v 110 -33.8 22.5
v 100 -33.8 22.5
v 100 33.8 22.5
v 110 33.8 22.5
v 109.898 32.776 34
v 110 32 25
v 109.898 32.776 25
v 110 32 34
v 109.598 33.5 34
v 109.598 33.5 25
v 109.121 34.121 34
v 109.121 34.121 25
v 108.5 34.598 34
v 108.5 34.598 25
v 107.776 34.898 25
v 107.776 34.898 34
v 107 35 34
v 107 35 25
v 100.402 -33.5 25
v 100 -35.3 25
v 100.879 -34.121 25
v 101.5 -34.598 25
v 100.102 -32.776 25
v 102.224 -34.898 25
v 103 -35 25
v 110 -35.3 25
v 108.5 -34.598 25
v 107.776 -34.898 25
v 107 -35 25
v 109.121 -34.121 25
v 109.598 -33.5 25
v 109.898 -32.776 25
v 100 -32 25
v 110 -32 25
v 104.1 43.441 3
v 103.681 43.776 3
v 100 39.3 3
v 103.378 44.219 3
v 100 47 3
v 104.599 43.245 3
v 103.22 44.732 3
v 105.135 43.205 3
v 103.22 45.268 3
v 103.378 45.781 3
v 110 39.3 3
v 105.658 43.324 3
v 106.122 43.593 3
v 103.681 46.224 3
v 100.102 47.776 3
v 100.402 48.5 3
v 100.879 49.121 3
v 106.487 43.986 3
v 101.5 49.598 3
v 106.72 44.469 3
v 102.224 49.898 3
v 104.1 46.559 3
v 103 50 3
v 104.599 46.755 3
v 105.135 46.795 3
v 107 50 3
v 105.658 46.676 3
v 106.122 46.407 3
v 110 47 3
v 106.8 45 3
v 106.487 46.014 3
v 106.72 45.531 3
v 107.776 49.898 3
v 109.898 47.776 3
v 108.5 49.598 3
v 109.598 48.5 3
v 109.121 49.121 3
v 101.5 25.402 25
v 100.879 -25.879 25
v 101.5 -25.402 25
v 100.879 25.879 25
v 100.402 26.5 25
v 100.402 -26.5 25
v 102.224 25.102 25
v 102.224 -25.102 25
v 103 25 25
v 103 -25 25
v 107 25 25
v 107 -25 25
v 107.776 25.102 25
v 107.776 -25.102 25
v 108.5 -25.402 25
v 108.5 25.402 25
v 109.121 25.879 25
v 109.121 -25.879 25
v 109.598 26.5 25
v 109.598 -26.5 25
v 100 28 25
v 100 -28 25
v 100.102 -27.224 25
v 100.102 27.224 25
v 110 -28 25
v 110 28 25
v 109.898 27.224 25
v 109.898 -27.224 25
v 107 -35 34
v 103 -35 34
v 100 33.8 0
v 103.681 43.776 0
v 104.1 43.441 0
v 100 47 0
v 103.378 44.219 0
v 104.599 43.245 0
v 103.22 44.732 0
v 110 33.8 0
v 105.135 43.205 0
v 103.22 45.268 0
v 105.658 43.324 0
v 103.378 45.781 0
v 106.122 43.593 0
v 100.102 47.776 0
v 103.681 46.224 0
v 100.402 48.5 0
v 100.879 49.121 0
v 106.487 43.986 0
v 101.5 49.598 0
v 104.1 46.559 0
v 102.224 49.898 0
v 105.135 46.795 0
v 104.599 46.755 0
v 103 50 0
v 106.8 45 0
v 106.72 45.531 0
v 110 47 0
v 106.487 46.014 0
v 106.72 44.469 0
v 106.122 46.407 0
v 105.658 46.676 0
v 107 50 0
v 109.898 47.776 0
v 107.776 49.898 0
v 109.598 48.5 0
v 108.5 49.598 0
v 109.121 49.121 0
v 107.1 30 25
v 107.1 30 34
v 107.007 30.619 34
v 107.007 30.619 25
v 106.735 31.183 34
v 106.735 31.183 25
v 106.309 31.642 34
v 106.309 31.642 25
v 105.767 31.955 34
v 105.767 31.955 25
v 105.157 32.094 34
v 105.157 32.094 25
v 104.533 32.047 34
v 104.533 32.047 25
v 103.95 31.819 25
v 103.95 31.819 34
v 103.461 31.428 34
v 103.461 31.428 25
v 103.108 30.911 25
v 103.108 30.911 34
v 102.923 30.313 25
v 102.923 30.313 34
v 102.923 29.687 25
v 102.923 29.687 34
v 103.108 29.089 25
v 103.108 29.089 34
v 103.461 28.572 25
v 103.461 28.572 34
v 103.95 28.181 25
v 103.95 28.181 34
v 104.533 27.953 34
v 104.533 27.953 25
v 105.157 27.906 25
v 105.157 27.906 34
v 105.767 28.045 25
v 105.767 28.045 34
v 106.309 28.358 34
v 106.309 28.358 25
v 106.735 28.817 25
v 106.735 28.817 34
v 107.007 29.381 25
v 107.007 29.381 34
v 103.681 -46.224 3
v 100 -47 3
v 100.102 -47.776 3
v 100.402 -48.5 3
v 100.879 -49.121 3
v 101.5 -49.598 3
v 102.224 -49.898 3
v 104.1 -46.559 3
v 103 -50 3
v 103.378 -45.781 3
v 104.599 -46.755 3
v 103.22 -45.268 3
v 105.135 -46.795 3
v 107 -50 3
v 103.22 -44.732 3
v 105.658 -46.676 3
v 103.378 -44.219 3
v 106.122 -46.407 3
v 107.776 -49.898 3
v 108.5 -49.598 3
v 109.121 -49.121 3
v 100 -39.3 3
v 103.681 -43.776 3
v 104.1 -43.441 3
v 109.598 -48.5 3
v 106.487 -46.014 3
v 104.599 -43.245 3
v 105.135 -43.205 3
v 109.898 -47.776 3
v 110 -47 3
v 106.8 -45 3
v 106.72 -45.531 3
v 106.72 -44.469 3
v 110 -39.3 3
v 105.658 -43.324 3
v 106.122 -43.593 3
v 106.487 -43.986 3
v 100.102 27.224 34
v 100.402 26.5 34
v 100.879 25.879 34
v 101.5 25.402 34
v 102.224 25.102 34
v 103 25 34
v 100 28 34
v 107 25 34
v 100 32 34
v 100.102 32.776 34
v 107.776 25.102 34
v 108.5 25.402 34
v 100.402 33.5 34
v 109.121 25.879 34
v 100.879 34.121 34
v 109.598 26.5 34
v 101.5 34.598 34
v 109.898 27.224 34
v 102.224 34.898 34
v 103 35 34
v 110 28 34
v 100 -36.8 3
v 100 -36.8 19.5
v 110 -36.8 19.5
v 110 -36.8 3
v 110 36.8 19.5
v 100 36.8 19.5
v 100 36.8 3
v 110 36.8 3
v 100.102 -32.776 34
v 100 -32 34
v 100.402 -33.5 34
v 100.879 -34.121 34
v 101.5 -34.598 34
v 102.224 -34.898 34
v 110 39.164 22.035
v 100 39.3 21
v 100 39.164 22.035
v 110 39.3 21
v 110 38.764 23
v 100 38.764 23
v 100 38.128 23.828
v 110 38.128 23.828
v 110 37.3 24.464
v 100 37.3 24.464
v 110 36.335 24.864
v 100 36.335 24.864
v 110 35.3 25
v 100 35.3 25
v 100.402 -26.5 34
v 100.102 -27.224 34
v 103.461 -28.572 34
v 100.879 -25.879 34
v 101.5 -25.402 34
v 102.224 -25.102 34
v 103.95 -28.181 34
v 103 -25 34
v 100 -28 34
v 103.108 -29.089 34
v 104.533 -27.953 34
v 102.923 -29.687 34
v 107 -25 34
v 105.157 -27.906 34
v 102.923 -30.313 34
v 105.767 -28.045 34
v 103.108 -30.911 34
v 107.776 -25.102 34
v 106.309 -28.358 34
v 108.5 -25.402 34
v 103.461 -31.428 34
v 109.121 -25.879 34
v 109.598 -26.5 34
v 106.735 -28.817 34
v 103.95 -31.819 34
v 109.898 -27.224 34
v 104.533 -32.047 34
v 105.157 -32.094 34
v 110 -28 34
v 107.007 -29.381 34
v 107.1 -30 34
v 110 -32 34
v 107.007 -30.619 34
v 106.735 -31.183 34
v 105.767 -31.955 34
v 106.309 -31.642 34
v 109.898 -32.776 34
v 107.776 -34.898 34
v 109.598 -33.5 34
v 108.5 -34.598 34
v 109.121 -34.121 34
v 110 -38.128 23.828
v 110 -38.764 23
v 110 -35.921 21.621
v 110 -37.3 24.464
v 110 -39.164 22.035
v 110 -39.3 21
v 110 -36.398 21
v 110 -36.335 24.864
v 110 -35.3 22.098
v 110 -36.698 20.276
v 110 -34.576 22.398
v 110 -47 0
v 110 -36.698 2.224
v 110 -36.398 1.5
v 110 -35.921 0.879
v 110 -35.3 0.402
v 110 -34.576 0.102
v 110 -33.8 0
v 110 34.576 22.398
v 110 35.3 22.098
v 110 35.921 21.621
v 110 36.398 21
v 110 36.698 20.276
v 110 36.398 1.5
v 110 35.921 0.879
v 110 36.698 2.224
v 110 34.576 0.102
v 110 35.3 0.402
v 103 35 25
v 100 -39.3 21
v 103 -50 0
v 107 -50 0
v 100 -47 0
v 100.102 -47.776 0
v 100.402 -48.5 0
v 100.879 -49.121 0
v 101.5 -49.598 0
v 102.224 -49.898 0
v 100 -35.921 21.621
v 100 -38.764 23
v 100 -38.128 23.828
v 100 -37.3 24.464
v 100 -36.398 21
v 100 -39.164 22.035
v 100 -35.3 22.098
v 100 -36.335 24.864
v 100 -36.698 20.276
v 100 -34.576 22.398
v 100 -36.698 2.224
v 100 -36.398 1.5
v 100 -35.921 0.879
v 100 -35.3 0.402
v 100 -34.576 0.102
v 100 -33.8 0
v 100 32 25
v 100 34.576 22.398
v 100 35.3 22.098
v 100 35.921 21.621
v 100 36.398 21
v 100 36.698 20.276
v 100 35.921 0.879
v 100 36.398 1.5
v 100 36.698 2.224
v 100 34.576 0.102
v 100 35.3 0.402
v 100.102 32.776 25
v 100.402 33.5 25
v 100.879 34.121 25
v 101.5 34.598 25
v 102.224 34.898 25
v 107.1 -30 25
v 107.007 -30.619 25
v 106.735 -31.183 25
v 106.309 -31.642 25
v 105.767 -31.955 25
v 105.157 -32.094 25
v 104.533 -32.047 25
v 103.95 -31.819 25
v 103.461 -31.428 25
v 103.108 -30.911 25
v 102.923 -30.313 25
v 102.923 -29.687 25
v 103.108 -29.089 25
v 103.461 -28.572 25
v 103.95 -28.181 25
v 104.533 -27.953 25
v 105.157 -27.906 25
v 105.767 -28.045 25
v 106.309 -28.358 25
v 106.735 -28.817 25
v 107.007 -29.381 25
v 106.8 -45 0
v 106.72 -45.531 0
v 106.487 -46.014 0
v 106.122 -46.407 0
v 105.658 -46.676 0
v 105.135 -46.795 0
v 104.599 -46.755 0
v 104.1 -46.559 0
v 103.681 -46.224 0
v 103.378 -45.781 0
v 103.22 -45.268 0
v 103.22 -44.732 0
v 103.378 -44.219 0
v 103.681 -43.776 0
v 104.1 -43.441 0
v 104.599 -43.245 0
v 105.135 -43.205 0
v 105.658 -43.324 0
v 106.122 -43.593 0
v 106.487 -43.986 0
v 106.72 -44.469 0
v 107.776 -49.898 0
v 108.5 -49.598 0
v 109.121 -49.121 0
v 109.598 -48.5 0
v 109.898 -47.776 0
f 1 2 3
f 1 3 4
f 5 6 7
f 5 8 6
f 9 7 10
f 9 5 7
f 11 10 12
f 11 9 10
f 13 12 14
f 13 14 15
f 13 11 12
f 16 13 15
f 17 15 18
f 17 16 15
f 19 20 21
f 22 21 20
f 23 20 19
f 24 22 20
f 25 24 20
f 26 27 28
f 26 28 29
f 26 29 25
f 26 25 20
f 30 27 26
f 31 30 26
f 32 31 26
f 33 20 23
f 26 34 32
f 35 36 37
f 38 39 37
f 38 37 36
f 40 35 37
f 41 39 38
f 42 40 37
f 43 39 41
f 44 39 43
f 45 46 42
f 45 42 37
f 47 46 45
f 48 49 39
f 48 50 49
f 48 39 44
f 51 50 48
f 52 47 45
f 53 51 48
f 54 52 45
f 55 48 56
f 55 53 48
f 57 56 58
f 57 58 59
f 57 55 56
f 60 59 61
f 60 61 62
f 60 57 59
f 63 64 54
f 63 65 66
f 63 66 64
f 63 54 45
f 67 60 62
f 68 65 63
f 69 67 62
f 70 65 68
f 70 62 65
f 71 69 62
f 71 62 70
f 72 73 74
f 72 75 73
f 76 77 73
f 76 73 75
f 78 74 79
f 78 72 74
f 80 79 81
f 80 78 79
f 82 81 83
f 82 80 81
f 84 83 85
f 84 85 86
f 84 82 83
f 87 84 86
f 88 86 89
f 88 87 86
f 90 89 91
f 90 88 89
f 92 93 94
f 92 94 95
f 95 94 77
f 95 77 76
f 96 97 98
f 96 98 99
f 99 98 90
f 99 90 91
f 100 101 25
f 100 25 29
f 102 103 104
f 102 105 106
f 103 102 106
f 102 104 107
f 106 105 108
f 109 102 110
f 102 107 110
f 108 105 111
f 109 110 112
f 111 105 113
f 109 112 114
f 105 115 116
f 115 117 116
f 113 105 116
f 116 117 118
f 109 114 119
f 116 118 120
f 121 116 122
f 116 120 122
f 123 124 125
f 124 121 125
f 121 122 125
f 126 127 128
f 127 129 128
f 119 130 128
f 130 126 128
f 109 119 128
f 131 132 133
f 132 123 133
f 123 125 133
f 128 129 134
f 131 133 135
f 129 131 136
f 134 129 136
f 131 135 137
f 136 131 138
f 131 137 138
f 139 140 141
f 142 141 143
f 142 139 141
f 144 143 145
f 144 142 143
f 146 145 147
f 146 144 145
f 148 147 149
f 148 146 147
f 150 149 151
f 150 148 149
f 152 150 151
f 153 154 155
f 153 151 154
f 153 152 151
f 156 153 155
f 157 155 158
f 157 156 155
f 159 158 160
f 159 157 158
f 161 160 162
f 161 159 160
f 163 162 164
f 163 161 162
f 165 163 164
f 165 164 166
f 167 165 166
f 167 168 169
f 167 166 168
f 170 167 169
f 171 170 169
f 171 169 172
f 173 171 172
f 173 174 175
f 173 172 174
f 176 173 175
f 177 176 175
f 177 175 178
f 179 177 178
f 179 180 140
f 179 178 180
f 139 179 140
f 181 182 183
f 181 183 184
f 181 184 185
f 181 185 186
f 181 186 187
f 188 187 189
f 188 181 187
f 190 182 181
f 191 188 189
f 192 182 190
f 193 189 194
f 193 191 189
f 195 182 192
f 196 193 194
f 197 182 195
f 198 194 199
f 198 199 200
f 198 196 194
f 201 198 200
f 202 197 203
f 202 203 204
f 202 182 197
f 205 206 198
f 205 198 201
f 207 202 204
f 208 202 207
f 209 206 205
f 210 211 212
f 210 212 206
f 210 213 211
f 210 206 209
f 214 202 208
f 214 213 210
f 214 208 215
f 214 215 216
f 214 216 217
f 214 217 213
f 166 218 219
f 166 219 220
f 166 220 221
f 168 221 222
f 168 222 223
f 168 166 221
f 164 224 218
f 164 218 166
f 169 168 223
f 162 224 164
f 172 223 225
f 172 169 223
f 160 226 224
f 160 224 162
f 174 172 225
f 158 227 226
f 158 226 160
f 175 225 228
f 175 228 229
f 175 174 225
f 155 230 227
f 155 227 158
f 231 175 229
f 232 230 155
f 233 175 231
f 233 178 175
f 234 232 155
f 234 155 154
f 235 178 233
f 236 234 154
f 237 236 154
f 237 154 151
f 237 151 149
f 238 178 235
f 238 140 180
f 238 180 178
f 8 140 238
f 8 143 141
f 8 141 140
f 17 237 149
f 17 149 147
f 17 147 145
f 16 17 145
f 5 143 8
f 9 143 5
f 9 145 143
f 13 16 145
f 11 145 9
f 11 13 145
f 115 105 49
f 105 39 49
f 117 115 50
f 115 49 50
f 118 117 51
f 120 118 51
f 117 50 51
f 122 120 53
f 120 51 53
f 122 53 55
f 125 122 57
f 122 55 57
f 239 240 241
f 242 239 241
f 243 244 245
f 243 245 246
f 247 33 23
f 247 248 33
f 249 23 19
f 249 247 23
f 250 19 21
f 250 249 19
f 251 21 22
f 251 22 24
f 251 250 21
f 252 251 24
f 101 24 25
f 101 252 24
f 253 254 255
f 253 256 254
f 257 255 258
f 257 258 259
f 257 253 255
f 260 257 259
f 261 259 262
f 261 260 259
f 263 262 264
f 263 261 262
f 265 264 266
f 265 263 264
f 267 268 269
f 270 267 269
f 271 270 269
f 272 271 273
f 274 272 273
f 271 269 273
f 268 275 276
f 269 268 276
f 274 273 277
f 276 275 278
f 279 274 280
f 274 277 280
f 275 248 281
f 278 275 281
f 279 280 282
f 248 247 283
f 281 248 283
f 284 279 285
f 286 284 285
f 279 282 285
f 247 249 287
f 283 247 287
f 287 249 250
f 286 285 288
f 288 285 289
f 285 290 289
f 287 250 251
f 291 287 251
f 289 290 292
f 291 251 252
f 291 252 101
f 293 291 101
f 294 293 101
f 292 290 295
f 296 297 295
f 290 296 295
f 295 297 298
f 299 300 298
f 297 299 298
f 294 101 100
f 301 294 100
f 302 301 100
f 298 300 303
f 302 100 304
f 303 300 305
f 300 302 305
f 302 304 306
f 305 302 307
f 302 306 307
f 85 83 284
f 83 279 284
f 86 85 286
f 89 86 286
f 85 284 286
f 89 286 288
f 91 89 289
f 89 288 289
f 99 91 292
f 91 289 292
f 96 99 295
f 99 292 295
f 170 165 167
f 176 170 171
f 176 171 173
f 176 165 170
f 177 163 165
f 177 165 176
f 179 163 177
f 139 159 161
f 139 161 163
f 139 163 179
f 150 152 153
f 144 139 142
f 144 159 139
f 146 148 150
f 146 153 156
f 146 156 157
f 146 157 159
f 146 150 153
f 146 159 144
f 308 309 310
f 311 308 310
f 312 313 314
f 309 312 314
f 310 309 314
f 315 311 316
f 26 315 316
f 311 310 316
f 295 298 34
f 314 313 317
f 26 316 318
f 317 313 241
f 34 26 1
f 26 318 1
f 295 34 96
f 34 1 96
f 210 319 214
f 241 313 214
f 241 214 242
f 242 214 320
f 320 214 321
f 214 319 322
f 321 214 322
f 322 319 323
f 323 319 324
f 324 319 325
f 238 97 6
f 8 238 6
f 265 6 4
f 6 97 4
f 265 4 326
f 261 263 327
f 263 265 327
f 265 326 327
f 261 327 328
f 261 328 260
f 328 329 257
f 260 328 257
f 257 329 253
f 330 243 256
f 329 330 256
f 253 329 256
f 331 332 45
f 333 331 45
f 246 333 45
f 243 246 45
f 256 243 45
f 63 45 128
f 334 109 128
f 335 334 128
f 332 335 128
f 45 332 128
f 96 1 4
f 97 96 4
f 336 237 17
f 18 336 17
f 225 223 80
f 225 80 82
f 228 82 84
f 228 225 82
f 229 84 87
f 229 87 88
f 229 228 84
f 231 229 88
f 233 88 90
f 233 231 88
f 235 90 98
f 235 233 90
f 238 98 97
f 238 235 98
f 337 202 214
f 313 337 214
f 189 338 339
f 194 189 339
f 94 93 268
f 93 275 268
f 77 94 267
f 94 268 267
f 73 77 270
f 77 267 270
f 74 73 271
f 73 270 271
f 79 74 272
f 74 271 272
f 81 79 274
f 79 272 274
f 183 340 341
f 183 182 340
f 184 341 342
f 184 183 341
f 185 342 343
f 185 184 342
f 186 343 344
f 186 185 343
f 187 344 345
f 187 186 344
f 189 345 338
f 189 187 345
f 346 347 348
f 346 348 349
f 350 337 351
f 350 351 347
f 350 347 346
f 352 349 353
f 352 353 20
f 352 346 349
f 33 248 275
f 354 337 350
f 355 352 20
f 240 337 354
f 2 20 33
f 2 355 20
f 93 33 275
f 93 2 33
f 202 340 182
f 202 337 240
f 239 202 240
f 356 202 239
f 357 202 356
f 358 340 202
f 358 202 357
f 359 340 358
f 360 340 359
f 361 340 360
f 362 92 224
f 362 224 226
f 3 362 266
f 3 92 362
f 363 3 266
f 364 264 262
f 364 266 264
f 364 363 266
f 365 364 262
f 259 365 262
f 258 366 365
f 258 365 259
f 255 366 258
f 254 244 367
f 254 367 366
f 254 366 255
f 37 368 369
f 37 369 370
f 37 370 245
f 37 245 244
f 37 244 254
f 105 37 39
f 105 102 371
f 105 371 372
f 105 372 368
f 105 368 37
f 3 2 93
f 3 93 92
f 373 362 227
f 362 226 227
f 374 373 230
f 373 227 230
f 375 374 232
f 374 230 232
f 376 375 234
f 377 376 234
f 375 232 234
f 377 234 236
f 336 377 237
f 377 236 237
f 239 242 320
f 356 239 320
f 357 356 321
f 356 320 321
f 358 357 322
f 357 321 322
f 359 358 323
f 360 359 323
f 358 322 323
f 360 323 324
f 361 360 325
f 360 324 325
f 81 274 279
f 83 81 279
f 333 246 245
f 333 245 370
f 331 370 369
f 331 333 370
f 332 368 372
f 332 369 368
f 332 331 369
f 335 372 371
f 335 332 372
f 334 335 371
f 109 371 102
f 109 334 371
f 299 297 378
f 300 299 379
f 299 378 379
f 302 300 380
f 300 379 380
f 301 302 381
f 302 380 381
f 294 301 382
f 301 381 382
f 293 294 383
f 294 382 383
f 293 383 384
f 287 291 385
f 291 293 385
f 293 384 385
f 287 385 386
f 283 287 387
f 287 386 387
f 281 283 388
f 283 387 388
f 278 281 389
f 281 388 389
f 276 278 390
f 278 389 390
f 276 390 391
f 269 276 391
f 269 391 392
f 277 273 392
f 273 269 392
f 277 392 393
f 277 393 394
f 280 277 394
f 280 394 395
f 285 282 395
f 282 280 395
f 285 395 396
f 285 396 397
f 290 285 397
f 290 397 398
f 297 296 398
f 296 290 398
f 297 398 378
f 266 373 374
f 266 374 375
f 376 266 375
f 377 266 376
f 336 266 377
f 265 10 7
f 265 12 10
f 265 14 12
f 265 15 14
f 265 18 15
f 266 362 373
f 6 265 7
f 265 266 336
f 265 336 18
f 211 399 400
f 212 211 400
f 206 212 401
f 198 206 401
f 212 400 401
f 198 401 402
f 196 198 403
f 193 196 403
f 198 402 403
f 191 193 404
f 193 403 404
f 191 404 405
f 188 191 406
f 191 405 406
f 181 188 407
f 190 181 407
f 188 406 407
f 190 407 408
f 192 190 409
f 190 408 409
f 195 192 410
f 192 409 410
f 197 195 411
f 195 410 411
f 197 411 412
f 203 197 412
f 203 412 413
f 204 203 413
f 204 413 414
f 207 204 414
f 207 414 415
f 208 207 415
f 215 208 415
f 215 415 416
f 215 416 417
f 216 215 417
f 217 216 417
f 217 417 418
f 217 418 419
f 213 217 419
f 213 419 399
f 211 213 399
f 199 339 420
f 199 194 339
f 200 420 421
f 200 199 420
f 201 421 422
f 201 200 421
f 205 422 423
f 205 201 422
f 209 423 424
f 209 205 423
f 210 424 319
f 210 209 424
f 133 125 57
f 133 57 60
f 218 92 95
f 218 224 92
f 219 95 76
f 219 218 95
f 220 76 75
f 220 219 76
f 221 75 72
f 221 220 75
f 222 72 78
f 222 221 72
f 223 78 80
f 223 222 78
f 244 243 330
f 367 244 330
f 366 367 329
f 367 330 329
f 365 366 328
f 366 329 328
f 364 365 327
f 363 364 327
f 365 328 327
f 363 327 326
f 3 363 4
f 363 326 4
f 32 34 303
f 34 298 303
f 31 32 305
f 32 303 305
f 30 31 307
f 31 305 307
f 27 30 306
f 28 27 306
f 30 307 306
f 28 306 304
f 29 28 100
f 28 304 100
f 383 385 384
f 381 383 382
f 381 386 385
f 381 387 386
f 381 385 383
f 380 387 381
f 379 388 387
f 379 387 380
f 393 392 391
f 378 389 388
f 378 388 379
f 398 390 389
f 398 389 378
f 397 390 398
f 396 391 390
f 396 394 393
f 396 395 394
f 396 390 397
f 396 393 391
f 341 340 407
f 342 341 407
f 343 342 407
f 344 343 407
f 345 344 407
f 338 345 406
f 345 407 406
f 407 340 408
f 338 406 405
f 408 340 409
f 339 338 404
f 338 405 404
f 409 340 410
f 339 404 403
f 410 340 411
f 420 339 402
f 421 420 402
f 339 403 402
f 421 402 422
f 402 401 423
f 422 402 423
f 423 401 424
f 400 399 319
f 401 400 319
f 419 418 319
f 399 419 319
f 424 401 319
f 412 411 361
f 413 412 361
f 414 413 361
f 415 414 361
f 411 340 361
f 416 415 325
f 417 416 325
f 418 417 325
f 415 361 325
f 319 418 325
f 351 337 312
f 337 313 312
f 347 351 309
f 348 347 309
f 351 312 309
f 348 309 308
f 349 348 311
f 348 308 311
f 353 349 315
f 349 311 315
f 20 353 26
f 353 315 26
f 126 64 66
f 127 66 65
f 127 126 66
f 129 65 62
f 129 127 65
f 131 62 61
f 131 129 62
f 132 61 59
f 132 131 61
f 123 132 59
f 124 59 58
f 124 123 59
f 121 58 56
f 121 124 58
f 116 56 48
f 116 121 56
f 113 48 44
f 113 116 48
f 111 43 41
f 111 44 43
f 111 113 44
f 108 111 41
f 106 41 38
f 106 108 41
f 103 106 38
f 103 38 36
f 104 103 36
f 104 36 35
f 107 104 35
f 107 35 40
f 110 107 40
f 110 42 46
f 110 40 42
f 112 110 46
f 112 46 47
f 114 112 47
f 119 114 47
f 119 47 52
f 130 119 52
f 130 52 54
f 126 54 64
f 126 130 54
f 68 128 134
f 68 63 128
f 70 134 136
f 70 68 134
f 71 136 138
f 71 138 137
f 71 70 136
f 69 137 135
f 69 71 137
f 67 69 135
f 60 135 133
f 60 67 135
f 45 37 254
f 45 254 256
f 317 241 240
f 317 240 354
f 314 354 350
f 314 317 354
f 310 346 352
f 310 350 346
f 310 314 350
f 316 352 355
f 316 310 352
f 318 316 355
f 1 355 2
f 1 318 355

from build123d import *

# Parameters (mm, degrees)
BOX_W             = 141
BOX_H             = 73.6
BOX_DEPTH         = 22.5
FILLET_R          = 3
CYLINDER002_R     = 1.8
CYLINDER002_DEPTH = 10
BOX006_W          = 10
BOX006_H          = 78.6
BOX006_DEPTH      = 25
FILLET007_R       = 4
CYLINDER001_R     = 2.1
CYLINDER001_DEPTH = 10
BOX003_W          = 10
BOX003_H          = 10
BOX003_DEPTH      = 9
FILLET003_R       = 3
BOX007_W          = 10
BOX007_H          = 100
BOX007_DEPTH      = 3
FILLET006_R       = 3


with BuildPart() as battery_fillet:
    # Box → Box (new body)
    with BuildSketch(Plane(origin=(2, 0, 0), x_dir=(1, 0, 0), z_dir=(0, 0, 1))):
        with Locations((70.5, 36.8)):
            Rectangle(BOX_W, BOX_H)
    extrude(amount=BOX_DEPTH)

    # Fillet
    fillet_edges = [battery_fillet.edges().sort_by_distance(p)[0] for p in [
        (72.5, 0, 0),
        (72.5, 0, 22.5),
        (72.5, 73.6, 0),
        (72.5, 73.6, 22.5),
    ]]
    fillet(fillet_edges, radius=FILLET_R)


with BuildPart() as battery_fillet_1:
    # Fillet placement: moved
    add(battery_fillet.part.moved(Location((0, -36.8, 0))))


with BuildPart() as bolt_hole001:
    # Cylinder002 → Cylinder002 (new body)
    with BuildSketch(Plane(origin=(5, 45, 0), x_dir=(1, 0, 0), z_dir=(0, 0, 1))):
        Circle(CYLINDER002_R)
    extrude(amount=CYLINDER002_DEPTH)


with BuildPart() as bolt_hole_fusion001:
    # Part__Mirroring002: instance of bolt hole001
    add(bolt_hole001.part.mirror(Plane(origin=(0, 0, 0), x_dir=(1, 0, 0), z_dir=(0, 1, 0))))

    # Fusion002: union bolt hole001
    add(bolt_hole001.part)


with BuildPart() as back_wall_fillet001:
    # Box006 → Box006 (new body)
    with BuildSketch(Plane(origin=(0, -39.3, 0), x_dir=(1, 0, 0), z_dir=(0, 0, 1))):
        with Locations((5, 39.3)):
            Rectangle(BOX006_W, BOX006_H)
    extrude(amount=BOX006_DEPTH)

    # Fillet007
    fillet007_edges = [back_wall_fillet001.edges().sort_by_distance(p)[0] for p in [
        (5, -39.3, 25),
        (5, 39.3, 25),
    ]]
    fillet(fillet007_edges, radius=FILLET007_R)


with BuildPart() as insert_hole:
    # Cylinder001 → Cylinder001 (new body)
    with BuildSketch(Plane(origin=(5, 0, 0), x_dir=(1, 0, 0), z_dir=(0, 0, 1))):
        Circle(CYLINDER001_R)
    extrude(amount=CYLINDER001_DEPTH)


with BuildPart() as top_insert_box_cut:
    # Box003 → Box003 (new body)
    with BuildSketch(Plane(origin=(0, -5, 0), x_dir=(1, 0, 0), z_dir=(0, 0, 1))):
        with Locations((5, 5)):
            Rectangle(BOX003_W, BOX003_H)
    extrude(amount=BOX003_DEPTH)

    # Fillet003
    fillet003_edges = [top_insert_box_cut.edges().sort_by_distance(p)[0] for p in [
        (0, -5, 4.5),
        (0, 5, 4.5),
        (10, -5, 4.5),
        (10, 5, 4.5),
    ]]
    fillet(fillet003_edges, radius=FILLET003_R)

    # Cut: cut insert hole
    add(insert_hole.part, mode=Mode.SUBTRACT)


with BuildPart() as top_insert_box_cut_1:
    # Cut placement: moved
    add(top_insert_box_cut.part.moved(Location((0, 30, 25))))


with BuildPart() as part_mirroring001:
    # Part__Mirroring001: instance of top insert box cut
    add(top_insert_box_cut_1.part.mirror(Plane(origin=(0, 0, 0), x_dir=(1, 0, 0), z_dir=(0, 1, 0))))


with BuildPart() as battery_frame:
    # Box007 → Box007 (new body)
    with BuildSketch(Plane(origin=(0, -50, 0), x_dir=(1, 0, 0), z_dir=(0, 0, 1))):
        with Locations((5, 50)):
            Rectangle(BOX007_W, BOX007_H)
    extrude(amount=BOX007_DEPTH)

    # Fillet006
    fillet006_edges = [battery_frame.edges().sort_by_distance(p)[0] for p in [
        (0, -50, 1.5),
        (0, 50, 1.5),
        (10, -50, 1.5),
        (10, 50, 1.5),
    ]]
    fillet(fillet006_edges, radius=FILLET006_R)

    # Fusion003: union back wall fillet001, top insert box cut, Part__Mirroring001
    add(back_wall_fillet001.part)
    add(top_insert_box_cut_1.part)
    add(part_mirroring001.part)

    # Cut005: cut bolt hole fusion001
    add(bolt_hole_fusion001.part, mode=Mode.SUBTRACT)


with BuildPart() as battery_frame_1:
    # Cut005 placement: moved
    add(battery_frame.part.moved(Location((100, 0, 0))))

    # Cut006: cut battery fillet
    add(battery_fillet_1.part, mode=Mode.SUBTRACT)


solid = battery_frame_1.part
